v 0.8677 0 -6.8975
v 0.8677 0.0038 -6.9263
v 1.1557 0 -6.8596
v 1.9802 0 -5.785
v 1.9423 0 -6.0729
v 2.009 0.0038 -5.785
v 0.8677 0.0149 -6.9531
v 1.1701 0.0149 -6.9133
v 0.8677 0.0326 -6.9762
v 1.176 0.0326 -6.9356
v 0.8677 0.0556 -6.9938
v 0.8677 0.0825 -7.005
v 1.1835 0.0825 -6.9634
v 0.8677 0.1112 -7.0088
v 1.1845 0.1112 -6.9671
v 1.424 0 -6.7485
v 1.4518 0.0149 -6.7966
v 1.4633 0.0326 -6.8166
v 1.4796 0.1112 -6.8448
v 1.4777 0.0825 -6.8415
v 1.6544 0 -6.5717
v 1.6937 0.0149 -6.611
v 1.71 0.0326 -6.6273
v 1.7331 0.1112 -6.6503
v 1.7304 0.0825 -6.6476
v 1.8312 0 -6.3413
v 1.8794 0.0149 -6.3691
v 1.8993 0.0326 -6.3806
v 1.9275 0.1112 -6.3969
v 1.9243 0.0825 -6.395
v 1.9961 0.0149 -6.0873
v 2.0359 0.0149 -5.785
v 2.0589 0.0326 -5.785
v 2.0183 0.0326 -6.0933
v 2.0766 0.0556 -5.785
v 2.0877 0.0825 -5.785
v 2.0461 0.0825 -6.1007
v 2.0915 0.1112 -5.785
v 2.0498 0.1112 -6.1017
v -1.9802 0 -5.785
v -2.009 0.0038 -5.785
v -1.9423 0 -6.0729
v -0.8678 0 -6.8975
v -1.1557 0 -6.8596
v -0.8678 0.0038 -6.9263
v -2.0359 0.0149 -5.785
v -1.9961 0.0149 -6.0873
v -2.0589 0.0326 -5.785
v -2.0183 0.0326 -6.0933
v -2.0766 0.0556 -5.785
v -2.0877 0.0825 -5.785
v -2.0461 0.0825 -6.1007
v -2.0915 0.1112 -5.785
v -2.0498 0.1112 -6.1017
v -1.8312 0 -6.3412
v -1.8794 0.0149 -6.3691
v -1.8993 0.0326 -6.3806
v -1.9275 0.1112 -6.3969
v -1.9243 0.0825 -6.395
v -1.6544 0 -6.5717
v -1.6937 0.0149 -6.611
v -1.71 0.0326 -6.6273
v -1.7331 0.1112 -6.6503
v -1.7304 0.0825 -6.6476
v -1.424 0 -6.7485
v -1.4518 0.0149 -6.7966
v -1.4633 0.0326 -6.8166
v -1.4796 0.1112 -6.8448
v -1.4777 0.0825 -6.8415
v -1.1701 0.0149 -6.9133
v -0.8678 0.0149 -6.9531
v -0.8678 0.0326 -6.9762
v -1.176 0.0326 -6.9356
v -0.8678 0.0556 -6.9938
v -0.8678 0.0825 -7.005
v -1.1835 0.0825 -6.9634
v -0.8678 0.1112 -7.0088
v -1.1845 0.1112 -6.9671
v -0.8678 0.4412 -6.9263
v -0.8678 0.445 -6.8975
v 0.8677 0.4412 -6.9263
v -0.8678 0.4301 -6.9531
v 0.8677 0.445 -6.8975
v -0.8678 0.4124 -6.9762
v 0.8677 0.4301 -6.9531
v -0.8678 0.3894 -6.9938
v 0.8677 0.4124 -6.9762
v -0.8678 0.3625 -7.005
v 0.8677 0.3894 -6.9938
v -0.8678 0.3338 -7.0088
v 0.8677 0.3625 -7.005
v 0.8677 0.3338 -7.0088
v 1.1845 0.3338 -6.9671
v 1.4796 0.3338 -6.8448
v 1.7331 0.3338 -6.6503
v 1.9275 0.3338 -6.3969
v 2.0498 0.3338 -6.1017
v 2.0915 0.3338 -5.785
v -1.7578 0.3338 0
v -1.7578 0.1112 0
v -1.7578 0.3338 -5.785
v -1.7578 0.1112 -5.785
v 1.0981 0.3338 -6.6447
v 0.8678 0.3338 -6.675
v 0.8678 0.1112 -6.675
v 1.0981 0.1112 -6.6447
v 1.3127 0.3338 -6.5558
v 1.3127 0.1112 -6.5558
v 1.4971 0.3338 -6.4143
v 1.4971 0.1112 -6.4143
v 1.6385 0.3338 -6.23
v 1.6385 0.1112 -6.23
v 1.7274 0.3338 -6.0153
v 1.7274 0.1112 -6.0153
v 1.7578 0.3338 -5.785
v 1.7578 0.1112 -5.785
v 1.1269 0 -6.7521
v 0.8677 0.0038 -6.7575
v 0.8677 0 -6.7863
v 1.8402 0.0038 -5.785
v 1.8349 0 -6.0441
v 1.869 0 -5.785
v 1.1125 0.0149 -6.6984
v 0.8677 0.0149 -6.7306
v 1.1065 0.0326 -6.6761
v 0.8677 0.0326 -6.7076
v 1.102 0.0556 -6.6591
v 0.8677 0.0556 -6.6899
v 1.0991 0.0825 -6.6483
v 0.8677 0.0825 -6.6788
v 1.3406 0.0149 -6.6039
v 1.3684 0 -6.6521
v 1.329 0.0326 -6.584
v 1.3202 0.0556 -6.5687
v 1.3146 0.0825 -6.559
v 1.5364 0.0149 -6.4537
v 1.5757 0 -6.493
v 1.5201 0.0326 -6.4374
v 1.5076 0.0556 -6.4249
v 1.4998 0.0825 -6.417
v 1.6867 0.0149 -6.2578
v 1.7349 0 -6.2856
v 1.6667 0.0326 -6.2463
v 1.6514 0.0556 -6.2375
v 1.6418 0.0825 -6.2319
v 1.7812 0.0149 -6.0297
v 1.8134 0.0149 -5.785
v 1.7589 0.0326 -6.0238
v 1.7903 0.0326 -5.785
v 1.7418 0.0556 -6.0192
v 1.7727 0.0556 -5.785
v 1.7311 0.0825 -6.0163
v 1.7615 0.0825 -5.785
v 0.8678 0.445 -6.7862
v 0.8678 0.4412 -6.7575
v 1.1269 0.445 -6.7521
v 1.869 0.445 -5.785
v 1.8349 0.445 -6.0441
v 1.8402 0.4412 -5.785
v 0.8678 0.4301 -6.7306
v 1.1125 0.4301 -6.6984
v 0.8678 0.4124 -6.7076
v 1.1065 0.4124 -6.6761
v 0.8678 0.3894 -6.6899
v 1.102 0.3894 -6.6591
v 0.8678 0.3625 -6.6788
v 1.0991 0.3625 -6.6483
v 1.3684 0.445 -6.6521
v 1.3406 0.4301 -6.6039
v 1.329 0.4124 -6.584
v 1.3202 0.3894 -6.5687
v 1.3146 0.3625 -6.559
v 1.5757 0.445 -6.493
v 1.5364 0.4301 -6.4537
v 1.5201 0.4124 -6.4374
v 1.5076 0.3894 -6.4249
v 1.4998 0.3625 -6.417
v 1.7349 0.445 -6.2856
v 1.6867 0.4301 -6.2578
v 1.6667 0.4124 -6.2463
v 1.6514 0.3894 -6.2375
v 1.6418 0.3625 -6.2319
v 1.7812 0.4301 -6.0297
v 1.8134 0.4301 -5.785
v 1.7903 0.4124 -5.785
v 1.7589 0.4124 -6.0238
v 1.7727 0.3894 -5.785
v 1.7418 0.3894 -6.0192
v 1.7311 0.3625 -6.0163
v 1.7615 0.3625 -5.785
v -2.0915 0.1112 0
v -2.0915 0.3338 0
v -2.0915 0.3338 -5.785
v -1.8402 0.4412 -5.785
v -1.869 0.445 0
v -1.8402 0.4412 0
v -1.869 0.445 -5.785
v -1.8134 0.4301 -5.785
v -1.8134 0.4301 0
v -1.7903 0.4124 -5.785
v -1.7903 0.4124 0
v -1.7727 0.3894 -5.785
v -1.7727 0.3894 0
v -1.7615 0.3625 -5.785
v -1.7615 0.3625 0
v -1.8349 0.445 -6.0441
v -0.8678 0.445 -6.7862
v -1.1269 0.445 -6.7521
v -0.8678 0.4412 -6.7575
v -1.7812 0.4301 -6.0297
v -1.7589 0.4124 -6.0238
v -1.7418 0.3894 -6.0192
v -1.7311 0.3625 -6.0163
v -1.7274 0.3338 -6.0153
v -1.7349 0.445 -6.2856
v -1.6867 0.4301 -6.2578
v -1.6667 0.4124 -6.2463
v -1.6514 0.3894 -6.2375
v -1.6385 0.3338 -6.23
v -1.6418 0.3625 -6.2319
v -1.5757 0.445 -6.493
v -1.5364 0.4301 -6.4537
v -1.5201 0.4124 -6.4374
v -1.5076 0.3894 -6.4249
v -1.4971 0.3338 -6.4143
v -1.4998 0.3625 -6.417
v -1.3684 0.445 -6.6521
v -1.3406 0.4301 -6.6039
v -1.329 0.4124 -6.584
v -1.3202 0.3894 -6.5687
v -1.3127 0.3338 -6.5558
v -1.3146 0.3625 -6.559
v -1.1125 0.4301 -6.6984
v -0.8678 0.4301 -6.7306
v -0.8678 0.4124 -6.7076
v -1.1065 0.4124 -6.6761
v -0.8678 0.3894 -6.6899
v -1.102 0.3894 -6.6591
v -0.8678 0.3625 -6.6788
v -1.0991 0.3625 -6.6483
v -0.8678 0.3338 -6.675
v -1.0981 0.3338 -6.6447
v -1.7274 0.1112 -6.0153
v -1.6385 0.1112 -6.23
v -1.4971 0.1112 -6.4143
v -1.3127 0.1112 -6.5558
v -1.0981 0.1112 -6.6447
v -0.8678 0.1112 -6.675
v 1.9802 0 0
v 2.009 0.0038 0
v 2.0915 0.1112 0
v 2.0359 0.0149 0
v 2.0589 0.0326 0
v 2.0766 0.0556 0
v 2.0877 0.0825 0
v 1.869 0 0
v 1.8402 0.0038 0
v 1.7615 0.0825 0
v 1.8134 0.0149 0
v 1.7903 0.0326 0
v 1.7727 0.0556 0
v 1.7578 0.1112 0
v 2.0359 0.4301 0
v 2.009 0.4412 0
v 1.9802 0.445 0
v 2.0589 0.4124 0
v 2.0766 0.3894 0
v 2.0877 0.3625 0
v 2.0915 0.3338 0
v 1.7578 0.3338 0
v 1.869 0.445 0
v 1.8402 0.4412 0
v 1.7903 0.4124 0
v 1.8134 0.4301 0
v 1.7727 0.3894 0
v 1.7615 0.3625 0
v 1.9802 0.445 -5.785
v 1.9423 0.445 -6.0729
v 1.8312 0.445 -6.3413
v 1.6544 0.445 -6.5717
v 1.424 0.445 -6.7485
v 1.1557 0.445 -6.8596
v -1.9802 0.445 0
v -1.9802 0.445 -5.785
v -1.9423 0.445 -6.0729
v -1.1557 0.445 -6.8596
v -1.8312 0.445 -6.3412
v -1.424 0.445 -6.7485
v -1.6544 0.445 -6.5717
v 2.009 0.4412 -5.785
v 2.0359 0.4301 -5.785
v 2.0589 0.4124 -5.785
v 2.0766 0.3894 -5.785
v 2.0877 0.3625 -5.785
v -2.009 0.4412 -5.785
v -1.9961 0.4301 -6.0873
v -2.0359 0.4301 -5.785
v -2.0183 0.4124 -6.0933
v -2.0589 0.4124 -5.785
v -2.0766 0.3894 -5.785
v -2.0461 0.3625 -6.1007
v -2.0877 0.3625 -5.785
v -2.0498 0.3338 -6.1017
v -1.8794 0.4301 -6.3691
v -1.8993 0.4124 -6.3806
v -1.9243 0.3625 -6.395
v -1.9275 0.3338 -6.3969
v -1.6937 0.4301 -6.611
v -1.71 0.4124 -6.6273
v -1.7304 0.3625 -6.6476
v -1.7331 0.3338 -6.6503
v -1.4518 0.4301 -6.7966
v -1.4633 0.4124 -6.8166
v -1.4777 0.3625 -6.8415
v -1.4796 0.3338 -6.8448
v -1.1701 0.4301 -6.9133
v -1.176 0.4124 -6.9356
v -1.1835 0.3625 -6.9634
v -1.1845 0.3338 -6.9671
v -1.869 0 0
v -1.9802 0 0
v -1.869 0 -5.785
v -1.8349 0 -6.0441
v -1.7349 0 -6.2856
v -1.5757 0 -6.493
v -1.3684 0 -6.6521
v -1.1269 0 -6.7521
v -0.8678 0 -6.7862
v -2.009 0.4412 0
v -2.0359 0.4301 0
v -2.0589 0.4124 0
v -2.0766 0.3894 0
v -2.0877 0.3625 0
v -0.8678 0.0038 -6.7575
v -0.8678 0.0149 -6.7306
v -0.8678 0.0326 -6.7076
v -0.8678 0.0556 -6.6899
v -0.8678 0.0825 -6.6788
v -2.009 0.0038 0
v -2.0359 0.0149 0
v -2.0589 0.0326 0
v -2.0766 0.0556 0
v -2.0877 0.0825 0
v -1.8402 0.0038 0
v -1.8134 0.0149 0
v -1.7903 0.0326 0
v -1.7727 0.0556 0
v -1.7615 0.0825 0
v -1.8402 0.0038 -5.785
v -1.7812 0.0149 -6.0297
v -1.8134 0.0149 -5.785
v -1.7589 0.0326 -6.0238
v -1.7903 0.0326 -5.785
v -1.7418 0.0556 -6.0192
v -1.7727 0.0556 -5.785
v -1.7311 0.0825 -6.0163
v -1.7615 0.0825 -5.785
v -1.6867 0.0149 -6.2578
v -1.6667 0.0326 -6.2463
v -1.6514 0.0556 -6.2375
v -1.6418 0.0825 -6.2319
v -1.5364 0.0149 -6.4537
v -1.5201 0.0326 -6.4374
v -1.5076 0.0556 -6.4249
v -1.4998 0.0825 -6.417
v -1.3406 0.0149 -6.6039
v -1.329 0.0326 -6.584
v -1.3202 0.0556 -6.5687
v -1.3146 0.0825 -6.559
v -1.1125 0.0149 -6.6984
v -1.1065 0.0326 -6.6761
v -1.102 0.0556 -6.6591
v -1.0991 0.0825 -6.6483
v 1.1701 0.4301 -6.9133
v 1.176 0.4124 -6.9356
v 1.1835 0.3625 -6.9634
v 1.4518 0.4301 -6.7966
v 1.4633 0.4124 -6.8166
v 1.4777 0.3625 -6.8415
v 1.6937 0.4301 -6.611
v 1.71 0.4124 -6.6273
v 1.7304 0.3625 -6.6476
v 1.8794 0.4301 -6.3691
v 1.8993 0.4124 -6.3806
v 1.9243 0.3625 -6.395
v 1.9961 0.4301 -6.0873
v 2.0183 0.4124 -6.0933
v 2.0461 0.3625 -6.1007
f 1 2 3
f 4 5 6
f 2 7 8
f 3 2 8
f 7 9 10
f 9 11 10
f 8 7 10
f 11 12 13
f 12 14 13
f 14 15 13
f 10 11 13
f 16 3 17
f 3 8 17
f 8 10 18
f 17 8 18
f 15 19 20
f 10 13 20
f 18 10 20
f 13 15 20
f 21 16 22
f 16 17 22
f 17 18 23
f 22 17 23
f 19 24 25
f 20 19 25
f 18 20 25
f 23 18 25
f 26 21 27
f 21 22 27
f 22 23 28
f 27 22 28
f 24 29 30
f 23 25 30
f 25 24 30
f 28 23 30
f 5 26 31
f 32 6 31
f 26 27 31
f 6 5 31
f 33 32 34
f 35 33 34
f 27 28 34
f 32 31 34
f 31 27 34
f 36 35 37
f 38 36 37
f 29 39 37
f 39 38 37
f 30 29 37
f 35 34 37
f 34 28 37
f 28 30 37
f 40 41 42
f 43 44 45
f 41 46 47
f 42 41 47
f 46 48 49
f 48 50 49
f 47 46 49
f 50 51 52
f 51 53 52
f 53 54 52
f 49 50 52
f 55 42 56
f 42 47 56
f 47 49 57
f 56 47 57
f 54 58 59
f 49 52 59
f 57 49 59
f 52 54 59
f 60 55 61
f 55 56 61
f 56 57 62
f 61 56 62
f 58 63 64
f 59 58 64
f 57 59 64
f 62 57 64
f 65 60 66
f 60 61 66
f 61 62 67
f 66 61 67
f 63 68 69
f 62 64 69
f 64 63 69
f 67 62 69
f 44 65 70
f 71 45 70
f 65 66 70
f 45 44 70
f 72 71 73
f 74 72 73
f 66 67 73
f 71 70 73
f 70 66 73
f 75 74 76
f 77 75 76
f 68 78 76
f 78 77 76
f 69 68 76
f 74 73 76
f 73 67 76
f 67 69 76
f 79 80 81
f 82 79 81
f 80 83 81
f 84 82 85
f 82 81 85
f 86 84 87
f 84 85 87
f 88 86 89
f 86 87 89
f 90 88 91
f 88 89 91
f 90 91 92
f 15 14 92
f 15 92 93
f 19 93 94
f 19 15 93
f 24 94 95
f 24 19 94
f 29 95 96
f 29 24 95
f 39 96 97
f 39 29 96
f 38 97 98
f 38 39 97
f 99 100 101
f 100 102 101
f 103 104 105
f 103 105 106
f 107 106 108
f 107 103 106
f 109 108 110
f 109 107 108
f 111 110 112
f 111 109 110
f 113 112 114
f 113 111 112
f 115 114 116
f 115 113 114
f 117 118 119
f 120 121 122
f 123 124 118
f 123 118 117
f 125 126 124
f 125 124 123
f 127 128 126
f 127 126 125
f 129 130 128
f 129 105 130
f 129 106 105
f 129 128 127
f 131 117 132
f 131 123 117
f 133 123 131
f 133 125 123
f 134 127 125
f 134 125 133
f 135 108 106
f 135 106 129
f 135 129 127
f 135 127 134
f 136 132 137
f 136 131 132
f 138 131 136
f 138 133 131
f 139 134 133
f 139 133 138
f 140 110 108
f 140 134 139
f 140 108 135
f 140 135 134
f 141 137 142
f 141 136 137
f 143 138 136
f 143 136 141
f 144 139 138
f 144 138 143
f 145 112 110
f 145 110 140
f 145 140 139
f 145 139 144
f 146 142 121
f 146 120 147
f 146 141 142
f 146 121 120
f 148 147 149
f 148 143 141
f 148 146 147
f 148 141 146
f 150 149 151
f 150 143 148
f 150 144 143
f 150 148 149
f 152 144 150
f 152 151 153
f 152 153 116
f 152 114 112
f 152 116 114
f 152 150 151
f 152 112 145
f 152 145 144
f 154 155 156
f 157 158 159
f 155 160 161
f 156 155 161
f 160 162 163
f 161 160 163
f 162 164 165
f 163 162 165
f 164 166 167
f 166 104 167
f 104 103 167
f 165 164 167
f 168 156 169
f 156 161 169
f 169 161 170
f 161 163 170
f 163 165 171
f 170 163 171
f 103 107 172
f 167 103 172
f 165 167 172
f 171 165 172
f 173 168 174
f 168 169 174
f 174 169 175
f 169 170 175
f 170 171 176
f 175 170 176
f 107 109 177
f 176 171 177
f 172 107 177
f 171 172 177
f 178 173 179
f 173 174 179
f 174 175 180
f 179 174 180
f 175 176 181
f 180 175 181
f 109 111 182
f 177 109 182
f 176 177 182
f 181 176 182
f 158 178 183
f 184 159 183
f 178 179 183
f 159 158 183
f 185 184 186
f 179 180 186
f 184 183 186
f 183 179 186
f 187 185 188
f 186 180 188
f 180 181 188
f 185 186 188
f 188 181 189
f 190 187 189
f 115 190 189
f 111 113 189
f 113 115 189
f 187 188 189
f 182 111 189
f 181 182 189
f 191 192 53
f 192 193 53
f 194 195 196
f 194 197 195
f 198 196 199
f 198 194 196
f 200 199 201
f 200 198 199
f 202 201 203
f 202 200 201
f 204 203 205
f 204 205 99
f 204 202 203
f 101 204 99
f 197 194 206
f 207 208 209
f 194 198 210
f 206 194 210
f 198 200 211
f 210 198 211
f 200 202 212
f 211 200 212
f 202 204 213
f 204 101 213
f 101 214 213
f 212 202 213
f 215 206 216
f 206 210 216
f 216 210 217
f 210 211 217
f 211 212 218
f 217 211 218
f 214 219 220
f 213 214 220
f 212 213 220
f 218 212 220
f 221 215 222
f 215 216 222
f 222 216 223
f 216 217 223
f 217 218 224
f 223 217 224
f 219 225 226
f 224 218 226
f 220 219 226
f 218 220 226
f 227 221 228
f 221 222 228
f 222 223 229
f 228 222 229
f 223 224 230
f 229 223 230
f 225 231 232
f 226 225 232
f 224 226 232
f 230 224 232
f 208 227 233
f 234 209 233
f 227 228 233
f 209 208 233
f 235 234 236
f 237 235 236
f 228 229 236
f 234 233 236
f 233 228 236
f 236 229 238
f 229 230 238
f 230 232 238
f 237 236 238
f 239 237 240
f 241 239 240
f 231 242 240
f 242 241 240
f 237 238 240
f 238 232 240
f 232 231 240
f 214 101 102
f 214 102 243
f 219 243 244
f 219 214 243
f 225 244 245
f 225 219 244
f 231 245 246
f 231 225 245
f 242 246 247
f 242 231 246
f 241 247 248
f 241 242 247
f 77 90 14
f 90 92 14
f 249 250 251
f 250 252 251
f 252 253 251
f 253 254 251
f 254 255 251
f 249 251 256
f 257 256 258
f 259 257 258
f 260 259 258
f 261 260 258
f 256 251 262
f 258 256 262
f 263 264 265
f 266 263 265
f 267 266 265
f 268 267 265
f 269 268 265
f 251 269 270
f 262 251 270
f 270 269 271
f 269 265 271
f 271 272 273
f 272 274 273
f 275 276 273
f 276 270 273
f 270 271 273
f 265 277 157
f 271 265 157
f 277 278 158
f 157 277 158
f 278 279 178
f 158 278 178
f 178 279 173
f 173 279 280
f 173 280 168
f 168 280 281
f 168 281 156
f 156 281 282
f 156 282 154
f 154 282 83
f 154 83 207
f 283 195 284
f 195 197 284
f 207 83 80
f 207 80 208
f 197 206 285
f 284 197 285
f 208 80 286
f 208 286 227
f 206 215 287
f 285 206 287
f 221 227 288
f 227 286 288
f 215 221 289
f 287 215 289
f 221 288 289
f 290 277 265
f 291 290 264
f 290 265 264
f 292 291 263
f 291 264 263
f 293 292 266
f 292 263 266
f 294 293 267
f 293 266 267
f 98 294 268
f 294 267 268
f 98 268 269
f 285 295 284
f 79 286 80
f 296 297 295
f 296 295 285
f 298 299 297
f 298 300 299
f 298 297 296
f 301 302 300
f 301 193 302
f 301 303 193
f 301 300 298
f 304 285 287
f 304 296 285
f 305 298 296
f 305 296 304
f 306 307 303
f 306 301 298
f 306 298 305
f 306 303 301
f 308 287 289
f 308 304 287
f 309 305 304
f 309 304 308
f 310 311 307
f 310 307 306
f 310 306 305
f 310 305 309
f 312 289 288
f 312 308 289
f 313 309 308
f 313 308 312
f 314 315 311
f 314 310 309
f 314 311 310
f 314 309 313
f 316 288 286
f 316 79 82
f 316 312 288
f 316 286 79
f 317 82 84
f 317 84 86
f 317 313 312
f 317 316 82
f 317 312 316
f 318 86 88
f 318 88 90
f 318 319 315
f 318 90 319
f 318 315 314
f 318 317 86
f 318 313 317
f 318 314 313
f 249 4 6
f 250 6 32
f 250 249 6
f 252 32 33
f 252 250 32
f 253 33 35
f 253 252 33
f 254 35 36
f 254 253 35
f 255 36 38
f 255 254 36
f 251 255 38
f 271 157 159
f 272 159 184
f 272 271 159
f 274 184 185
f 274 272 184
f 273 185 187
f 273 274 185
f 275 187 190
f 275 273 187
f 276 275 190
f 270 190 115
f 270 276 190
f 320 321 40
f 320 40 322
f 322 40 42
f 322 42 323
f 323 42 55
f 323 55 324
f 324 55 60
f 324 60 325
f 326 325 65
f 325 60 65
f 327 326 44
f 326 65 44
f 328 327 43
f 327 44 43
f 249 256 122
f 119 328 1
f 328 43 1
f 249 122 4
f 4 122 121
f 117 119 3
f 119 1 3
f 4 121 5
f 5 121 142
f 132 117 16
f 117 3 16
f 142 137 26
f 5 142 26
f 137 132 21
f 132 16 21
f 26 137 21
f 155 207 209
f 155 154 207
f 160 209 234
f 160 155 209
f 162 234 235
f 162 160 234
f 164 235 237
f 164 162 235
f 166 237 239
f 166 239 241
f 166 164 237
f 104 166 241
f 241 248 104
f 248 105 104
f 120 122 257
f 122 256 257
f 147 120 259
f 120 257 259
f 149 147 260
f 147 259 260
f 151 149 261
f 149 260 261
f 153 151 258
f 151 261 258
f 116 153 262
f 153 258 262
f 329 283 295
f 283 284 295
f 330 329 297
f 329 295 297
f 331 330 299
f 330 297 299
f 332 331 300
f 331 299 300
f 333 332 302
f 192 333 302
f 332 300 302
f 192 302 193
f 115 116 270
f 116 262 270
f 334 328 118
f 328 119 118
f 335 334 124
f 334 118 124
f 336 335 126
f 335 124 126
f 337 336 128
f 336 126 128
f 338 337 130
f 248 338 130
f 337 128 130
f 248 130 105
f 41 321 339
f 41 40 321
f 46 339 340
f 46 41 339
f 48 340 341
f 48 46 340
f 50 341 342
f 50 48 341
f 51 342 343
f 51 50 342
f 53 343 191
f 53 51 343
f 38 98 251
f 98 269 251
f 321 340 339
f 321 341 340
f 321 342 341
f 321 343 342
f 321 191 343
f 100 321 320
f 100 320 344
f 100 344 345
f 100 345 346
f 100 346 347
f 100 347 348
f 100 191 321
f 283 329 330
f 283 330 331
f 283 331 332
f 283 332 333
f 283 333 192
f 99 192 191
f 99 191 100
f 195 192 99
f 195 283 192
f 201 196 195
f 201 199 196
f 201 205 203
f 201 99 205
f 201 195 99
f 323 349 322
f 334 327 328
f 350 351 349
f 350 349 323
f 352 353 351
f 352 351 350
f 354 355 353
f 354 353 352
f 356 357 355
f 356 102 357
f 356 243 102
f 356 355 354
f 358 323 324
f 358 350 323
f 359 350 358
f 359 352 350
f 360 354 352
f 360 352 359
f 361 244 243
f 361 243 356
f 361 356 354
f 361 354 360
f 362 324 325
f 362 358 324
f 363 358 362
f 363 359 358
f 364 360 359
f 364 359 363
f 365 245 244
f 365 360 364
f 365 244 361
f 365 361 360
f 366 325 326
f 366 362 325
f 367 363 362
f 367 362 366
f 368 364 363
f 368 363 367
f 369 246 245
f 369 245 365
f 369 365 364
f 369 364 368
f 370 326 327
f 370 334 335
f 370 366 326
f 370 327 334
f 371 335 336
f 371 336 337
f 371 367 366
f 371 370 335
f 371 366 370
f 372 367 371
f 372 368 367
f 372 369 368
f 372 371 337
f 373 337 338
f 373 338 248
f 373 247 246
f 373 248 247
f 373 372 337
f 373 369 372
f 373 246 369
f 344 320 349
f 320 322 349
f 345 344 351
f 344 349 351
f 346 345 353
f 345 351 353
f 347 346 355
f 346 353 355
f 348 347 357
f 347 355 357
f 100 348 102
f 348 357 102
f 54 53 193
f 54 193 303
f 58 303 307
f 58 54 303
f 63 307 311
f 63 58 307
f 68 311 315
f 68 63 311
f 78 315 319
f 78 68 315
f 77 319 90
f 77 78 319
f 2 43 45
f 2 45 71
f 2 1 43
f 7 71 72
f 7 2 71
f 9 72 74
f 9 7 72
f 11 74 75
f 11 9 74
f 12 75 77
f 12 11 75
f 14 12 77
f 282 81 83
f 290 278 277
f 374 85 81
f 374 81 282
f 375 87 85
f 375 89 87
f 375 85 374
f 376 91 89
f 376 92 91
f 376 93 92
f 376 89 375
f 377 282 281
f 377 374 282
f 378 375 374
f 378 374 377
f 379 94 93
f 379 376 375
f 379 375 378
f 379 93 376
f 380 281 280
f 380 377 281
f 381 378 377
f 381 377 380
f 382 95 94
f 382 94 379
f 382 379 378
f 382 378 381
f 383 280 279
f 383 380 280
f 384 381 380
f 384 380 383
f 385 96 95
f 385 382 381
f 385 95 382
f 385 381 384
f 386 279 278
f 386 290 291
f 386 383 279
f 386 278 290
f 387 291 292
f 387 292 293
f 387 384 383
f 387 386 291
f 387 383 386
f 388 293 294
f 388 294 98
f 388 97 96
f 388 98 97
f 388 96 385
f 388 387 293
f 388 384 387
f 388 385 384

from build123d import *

# Parameters (mm, degrees)
SKETCH2_W    = 0.75
SKETCH2_H    = 1
FILLET1_R    = 0.25
SCALE1_SCALE = 0.445


with BuildPart() as part:
    # Sweep1: sweep along a path in Sketch1
    with BuildLine(Plane(origin=(0, 0, 0), x_dir=(1, 0, 0), z_dir=(0, 1, 0))) as sweep1_path:
        Line((-3.95, 0), (-3.95, 13))
        ThreePointArc((-3.95, 13), (-3.364213562, 14.414213562), (-1.95, 15))
        Line((-1.95, 15), (1.95, 15))
        ThreePointArc((1.95, 15), (3.364213562, 14.414213562), (3.95, 13))
        Line((3.95, 13), (3.95, 0))
    # Sketch2 → Sweep1 (sweep)
    with BuildSketch(Plane.XY):
        with Locations((-4.325, 0.5)):
            Rectangle(SKETCH2_W, SKETCH2_H)
    sweep(path=sweep1_path.line)

    # Fillet1
    fillet1_edges = [part.edges().sort_by_distance(p)[0] for p in [
        (3.95, 1, -6.5),
        (4.7, 1, -6.5),
        (4.7, 0, -6.5),
        (-3.95, 0, -6.5),
        (-3.95, 1, -6.5),
        (-4.7, 1, -6.5),
        (-4.7, 0, -6.5),
        (-3.364213562, 0, -14.414213562),
        (-3.364213562, 1, -14.414213562),
        (-3.894543648, 1, -14.944543648),
        (-3.894543648, 0, -14.944543648),
        (0, 0, -15),
        (0, 1, -15),
        (0, 1, -15.75),
        (0, 0, -15.75),
        (3.364213562, 0, -14.414213562),
        (3.364213562, 1, -14.414213562),
        (3.894543648, 1, -14.944543648),
        (3.894543648, 0, -14.944543648),
        (3.95, 0, -6.5),
    ]]
    fillet(fillet1_edges, radius=FILLET1_R)


with BuildPart() as part_1:
    # Scale1: scaled about (0, 0, 0)
    add(part.part.scale(SCALE1_SCALE))


solid = part_1.part
